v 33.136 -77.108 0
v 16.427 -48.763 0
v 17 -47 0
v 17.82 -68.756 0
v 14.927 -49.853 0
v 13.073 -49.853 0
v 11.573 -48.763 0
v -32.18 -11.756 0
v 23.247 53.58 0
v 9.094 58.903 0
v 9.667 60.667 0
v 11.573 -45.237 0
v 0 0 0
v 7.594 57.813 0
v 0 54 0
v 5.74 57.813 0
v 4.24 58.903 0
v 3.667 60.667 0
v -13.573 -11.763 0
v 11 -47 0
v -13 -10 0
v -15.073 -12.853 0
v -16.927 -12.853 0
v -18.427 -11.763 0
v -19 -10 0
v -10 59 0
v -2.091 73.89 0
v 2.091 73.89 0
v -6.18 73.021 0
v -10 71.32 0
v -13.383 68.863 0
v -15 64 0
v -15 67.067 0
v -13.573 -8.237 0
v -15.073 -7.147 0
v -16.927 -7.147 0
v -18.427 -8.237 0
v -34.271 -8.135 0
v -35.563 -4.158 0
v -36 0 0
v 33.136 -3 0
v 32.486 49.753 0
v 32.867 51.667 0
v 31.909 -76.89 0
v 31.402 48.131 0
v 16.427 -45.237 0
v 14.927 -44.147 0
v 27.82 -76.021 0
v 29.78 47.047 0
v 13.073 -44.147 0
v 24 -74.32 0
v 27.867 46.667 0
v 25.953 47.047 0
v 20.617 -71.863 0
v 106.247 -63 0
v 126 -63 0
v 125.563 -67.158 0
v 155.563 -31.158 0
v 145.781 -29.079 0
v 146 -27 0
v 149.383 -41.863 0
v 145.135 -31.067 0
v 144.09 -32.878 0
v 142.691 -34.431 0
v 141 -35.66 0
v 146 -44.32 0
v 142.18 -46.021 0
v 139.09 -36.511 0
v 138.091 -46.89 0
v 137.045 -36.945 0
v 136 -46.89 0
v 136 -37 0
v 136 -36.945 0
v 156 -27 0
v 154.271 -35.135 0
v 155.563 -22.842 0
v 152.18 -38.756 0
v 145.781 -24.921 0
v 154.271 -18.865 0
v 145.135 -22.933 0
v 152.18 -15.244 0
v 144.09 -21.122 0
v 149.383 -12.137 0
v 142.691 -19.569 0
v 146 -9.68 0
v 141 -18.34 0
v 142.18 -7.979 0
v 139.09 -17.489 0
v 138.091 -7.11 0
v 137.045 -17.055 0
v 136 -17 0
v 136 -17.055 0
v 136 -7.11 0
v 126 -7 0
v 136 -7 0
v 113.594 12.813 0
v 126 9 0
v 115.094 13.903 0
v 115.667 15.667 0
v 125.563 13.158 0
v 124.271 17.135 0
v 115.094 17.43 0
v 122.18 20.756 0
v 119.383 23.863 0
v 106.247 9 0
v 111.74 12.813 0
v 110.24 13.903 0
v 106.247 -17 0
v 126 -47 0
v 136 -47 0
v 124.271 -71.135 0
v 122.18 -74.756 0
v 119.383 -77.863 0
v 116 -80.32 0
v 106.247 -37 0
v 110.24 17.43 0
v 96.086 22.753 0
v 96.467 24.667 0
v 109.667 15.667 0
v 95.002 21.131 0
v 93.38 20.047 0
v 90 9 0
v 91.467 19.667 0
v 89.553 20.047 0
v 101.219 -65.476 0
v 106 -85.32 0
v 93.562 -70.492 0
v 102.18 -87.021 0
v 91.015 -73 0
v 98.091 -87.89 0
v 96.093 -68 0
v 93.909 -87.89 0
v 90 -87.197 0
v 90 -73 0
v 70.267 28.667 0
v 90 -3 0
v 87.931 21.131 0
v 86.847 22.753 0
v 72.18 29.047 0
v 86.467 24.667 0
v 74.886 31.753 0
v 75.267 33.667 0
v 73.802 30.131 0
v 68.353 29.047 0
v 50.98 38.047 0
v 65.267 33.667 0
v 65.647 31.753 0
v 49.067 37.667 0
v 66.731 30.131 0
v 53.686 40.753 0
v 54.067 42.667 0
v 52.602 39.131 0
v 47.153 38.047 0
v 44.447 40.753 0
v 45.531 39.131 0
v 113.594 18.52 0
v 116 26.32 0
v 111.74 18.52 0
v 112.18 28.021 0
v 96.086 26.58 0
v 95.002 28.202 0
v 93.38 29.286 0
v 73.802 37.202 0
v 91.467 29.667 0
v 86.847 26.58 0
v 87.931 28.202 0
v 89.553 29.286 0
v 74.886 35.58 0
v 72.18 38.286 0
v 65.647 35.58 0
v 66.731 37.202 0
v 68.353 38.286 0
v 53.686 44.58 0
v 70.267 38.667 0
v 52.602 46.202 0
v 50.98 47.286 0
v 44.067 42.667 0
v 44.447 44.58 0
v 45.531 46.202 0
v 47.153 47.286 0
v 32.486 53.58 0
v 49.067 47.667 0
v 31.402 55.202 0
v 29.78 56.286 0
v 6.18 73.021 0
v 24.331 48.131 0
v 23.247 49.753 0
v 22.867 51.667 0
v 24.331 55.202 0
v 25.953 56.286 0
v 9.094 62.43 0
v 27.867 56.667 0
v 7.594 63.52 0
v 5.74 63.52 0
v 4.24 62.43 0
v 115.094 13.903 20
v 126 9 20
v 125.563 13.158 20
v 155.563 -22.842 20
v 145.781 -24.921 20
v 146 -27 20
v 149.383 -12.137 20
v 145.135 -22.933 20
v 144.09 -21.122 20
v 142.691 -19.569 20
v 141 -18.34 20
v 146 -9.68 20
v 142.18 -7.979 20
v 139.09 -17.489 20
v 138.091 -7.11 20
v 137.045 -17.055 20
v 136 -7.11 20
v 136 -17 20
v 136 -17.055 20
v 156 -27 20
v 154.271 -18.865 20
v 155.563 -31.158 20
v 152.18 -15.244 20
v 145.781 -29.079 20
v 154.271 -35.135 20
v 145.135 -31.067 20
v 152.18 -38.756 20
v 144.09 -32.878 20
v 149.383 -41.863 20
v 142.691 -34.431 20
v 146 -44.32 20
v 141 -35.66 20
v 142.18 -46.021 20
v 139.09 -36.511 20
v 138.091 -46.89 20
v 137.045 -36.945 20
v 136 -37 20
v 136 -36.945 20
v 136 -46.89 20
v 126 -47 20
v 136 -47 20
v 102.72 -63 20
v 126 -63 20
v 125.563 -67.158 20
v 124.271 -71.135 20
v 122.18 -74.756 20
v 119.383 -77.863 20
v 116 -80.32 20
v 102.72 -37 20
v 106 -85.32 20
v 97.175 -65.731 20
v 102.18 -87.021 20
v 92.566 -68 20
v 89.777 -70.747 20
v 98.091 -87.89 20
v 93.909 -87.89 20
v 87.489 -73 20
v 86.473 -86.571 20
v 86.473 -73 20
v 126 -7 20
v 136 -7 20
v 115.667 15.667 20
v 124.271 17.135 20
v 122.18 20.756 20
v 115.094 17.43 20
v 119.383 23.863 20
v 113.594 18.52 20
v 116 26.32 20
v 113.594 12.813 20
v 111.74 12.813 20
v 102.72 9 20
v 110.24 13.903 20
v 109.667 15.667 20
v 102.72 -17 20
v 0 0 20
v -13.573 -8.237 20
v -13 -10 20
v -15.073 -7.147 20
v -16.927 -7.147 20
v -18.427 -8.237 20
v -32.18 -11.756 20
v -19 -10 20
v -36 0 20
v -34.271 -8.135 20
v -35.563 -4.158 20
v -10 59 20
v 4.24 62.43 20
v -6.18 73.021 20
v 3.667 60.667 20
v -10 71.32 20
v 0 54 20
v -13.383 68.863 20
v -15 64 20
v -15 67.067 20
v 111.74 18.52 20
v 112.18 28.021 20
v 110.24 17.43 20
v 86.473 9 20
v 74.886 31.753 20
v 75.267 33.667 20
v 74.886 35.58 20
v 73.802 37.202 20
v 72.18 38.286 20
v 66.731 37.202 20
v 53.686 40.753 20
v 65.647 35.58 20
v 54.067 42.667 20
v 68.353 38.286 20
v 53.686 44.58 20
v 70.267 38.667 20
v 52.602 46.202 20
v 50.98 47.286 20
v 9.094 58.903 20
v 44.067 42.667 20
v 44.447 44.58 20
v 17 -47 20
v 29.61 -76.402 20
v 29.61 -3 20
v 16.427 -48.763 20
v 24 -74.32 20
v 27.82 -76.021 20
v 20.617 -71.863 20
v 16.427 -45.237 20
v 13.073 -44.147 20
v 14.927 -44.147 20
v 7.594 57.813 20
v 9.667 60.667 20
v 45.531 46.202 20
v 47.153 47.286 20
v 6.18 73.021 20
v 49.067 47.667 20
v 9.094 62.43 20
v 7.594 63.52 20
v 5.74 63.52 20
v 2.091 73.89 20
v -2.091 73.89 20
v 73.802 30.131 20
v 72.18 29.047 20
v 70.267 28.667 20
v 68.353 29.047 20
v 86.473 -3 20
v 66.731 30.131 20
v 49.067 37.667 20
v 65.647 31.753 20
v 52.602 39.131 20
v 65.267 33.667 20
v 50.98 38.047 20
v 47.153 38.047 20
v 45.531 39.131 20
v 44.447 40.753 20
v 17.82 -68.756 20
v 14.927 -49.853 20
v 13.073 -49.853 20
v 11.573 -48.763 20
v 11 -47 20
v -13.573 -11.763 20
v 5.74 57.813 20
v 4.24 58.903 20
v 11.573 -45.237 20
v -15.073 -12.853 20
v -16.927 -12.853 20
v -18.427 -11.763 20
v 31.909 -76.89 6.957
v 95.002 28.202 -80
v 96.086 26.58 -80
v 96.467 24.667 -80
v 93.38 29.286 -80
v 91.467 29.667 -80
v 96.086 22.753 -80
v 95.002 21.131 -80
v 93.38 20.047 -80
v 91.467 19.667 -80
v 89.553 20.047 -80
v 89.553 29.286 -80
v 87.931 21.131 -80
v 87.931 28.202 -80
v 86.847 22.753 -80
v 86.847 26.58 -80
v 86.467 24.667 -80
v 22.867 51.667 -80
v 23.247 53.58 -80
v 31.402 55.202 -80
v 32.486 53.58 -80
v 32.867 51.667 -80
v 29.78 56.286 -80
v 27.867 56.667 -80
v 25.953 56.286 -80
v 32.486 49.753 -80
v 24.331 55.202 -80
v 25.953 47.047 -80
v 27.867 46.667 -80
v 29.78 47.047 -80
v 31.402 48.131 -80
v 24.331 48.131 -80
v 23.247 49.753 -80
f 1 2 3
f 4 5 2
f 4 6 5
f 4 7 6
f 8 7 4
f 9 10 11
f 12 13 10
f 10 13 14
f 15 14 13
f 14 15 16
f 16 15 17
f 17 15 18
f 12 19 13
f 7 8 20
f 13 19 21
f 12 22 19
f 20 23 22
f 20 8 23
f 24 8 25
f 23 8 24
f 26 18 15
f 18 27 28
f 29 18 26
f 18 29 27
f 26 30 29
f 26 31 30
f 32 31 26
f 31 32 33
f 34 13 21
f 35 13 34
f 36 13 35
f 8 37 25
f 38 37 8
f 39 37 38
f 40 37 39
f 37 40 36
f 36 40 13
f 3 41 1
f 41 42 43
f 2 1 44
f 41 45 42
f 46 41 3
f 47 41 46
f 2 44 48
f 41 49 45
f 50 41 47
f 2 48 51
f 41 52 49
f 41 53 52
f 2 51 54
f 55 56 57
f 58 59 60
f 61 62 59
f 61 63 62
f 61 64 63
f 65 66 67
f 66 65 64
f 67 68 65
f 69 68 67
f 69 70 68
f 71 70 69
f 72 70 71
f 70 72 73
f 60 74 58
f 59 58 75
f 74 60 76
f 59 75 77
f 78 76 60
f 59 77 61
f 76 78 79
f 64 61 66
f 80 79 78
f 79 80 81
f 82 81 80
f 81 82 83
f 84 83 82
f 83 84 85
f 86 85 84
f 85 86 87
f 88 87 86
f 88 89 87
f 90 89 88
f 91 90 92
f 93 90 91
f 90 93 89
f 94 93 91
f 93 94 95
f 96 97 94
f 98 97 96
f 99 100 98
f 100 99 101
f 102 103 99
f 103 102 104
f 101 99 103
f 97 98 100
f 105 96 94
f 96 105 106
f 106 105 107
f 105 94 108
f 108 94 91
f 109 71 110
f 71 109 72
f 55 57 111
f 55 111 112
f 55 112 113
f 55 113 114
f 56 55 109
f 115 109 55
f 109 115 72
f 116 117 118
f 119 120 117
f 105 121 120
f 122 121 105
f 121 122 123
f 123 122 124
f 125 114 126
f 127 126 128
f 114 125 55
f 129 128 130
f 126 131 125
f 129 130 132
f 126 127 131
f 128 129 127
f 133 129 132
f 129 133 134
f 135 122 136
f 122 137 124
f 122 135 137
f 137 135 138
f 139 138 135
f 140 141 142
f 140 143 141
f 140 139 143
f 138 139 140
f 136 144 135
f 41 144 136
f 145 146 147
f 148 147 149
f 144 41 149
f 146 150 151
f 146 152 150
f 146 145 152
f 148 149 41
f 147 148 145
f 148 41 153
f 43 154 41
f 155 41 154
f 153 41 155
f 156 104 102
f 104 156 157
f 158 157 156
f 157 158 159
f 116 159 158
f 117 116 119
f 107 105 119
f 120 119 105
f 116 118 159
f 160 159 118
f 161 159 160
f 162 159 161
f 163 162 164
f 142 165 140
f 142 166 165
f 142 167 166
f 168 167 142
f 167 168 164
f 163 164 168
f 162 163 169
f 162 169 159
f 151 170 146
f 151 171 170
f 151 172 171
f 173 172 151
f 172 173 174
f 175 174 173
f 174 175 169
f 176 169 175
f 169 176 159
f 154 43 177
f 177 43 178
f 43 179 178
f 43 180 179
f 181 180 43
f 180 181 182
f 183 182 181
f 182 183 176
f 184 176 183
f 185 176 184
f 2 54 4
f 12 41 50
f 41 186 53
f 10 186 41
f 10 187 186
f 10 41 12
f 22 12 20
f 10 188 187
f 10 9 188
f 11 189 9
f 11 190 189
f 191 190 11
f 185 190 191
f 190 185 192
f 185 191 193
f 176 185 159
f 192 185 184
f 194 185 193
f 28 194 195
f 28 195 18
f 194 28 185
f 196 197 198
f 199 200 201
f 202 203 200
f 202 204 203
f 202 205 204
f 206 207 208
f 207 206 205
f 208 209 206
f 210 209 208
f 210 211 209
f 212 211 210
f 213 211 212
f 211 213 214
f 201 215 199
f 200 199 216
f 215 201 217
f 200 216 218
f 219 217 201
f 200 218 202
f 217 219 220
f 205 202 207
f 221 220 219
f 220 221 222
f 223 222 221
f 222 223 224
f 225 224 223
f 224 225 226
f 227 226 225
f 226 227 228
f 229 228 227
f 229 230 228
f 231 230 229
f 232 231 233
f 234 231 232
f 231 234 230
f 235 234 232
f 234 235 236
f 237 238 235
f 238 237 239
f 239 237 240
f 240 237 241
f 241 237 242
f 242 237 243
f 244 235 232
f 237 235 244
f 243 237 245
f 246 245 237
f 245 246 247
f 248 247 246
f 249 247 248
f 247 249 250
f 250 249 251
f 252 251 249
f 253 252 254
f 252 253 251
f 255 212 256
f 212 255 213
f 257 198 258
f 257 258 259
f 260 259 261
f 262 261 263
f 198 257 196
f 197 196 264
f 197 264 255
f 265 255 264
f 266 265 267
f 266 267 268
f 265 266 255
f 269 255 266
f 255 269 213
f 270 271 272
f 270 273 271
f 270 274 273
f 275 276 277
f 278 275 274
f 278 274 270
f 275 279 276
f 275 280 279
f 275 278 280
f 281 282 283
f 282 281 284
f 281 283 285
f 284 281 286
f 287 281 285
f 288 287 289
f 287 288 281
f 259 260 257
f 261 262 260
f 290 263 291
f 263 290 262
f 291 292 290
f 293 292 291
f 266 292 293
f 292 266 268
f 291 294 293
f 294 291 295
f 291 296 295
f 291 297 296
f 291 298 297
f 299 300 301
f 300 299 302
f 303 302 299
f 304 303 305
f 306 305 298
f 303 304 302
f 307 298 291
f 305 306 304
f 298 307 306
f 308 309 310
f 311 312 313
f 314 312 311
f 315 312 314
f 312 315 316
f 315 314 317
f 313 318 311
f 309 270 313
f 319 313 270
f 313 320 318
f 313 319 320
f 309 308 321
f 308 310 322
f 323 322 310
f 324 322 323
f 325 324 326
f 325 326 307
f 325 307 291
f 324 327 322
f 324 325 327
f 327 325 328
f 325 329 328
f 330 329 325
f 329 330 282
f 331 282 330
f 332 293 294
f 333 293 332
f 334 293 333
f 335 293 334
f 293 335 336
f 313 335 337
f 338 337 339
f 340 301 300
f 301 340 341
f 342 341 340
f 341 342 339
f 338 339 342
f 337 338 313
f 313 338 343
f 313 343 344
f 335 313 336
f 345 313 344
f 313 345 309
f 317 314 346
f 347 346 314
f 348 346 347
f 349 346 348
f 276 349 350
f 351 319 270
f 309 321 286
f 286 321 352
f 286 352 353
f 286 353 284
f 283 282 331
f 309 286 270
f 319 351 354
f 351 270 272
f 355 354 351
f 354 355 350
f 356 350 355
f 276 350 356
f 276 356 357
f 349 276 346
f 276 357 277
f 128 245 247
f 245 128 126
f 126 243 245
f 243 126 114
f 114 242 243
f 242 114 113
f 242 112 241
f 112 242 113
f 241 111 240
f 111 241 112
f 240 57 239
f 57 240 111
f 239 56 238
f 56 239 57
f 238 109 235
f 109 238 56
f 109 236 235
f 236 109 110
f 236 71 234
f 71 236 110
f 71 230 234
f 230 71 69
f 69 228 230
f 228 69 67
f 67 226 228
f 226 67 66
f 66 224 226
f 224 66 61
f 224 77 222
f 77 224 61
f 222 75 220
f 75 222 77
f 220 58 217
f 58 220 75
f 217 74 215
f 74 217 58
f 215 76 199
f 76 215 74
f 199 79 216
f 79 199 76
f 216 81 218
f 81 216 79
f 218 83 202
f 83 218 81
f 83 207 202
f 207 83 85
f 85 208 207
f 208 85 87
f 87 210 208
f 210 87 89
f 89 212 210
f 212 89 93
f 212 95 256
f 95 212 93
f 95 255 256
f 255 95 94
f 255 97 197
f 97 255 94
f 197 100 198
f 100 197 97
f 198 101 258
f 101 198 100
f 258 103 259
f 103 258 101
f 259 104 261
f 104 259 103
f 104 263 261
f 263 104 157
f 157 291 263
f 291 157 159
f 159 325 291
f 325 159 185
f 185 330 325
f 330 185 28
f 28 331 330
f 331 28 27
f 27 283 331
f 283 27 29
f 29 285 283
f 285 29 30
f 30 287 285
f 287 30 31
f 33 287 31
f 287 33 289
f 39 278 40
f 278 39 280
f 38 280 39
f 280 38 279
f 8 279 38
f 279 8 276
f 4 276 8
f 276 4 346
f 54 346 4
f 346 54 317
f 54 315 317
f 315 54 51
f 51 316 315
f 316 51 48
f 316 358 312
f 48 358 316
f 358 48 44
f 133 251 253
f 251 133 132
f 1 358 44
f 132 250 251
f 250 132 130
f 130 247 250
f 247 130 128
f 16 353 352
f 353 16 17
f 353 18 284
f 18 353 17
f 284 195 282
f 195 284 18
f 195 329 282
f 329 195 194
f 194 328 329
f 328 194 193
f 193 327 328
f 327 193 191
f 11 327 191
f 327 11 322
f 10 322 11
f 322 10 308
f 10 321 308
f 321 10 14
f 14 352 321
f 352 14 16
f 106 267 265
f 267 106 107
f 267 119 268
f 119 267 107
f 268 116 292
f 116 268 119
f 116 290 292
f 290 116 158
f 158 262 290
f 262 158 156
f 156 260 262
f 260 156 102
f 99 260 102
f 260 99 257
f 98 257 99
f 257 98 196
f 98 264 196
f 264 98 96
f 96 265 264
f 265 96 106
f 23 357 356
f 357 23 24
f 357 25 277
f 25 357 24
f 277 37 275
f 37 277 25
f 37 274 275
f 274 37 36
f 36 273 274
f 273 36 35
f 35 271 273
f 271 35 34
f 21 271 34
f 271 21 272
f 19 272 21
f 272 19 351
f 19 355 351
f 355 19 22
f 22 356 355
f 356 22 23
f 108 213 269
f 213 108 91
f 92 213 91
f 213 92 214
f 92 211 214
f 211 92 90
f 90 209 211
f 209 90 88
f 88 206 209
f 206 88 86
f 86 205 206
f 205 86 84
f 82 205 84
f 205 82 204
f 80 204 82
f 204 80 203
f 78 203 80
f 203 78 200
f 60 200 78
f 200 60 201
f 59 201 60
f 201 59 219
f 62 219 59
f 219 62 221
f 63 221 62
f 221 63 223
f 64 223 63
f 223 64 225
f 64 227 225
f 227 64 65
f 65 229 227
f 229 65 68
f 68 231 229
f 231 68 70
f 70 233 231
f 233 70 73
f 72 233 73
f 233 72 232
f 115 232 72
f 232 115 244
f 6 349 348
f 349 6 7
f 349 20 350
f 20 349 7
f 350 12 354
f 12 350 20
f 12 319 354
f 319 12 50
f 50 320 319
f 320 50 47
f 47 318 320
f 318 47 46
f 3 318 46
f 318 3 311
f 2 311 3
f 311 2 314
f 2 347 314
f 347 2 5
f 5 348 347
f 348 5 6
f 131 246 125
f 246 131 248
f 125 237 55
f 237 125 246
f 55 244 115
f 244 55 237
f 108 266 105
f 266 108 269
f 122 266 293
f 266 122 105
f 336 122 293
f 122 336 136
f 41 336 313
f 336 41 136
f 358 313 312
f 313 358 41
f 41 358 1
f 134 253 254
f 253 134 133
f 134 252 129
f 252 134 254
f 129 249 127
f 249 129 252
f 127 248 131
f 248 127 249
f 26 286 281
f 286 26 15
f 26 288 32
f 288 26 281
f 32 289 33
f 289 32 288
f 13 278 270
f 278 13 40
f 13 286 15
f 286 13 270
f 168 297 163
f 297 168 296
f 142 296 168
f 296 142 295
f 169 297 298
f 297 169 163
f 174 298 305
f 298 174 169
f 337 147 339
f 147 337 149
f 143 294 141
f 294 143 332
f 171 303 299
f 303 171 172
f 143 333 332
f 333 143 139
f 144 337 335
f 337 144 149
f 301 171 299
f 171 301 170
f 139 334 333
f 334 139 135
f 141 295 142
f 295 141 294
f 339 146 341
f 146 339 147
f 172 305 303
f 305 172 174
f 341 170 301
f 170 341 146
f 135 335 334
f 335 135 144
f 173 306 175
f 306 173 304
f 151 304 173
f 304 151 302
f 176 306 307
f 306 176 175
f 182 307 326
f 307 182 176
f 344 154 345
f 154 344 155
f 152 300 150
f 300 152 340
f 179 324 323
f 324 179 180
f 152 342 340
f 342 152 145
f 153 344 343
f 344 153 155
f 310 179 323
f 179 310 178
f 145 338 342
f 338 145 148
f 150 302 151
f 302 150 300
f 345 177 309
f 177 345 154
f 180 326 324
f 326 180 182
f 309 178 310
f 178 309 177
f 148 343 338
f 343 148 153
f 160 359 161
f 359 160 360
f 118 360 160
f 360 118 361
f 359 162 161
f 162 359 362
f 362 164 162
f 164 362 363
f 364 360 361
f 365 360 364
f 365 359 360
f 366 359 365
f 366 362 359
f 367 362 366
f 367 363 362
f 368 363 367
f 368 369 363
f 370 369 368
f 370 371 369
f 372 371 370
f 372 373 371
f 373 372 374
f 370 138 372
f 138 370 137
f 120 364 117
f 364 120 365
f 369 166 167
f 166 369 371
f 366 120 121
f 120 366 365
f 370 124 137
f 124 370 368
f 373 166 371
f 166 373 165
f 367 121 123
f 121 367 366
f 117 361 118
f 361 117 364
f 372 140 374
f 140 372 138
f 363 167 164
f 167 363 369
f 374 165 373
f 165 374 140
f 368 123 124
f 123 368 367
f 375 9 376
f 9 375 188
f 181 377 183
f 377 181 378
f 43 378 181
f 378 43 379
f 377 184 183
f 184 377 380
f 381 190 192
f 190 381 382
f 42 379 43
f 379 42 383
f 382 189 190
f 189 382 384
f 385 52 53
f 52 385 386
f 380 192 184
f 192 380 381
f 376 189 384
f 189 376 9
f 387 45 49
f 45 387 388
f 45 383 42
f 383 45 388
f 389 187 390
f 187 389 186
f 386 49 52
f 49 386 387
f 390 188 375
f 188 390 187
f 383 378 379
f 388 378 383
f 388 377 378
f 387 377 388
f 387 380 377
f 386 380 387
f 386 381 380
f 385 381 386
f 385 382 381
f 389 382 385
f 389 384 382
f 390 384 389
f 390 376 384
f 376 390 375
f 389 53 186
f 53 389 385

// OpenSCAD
pw = 54; //Pillar without edge stuff
dy = 10;
dx = 5;
rd = 5; //Size of rubbery thing.

inf =200;

module pillar_profile()
{
    polygon([[-inf,0], [0,0], [0,pw], [-dy, pw + dx],
             [-dy-rd, pw + dx+rd], [-inf, pw + dx+rd]]);
    translate([-inf,0]) square([inf-dy-rd,inf]);
}

w=72;
h= 16;
ww=60;
wh=56;
wd = 13; //Distance between windows.

module window_profile()
{
    translate([h,w-ww+rd+dx-wd]) 
    {   polygon([[0,0], [0,-w],[-dy,-w-dx],[-dy-rd,-w-dx-rd],[-h,-w-dx-rd], [-h,0]]);
        translate([-h-wh,-w-dx-rd]) square([wh,ww]);
        translate([-h-wh,ww-w-inf]) square([wh,inf]);
    }
}


ex = 20;
l  = 90;
sl = 30;
cr = 3;

module fit_profile()
{
    x = l+h; y= w-ww+rd+dx-wd;

    difference()
    {   union()
        {   minkowski() //TODO spring-like structure to make putting it on easier.
            {
                polygon([[x-dy,y-w-dx], [x,y-w], [x,y], 
                         [0,pw], [0,0], [-h,0],
                         [x-wh-h, y-(w+ww)/2]]);
                circle(ex);
            }
            translate([x+sl,y-w/2])
            {   circle(ex);
                translate([-sl/2,0]) square([sl,2*ex],center=true);
            }
        }
        translate([x+sl,y-w/2])
        {   circle(ex/2);
            translate([-sl,0]) square([2*sl,ex],center=true);
        }
        translate([x+ex/3,y+ex/3]) circle(cr); //Holes for adding insolation or something.
        translate([ex/3,pw+ex/3]) circle(cr);
        translate([-h,-ex/2]) circle(cr);
        translate([x-wh-h-ex, y-(w+ww)/2+ex/2]) circle(cr);
    }
}

t = 20; //Thickness of plate.
a = 10; //Angle of window.

mf = 0.2; //Fractions the mounting cylinders go at.
mh = 60; //Height of mounting cylinders.
mr = 5; //idem, radius. 

module item()
{
    
    x = l+h+ex/3;  y= w-ww+rd+dx-wd+ex/3;
    dx = ex/3 - x; dy = pw + ex/3 - y;
    
    difference()
    {
        color([1,0,0]) linear_extrude(height=t) fit_profile();
        translate([l,0]) rotate([0,-a]) translate([0,0,-inf]) linear_extrude(height=2*inf) 
        window_profile();
        color([0,0,1]) translate([0,0,-inf]) linear_extrude(height=2*inf) pillar_profile();

        translate([x+2*mf*dx, y+2*mf*dy, -t]) cylinder(r=mr, h=3*t);
        translate([x+(1-2*mf)*dx, y+(1-2*mf)*dy, -t]) cylinder(r=mr, h=3*t);
    }
    translate([x+mf*dx, y+mf*dy, -mh-t]) cylinder(r=mr, h=mh+t);
    translate([x+(1-mf)*dx, y+(1-mf)*dy, -mh-t]) cylinder(r=mr, h=mh+t);
}

item();
